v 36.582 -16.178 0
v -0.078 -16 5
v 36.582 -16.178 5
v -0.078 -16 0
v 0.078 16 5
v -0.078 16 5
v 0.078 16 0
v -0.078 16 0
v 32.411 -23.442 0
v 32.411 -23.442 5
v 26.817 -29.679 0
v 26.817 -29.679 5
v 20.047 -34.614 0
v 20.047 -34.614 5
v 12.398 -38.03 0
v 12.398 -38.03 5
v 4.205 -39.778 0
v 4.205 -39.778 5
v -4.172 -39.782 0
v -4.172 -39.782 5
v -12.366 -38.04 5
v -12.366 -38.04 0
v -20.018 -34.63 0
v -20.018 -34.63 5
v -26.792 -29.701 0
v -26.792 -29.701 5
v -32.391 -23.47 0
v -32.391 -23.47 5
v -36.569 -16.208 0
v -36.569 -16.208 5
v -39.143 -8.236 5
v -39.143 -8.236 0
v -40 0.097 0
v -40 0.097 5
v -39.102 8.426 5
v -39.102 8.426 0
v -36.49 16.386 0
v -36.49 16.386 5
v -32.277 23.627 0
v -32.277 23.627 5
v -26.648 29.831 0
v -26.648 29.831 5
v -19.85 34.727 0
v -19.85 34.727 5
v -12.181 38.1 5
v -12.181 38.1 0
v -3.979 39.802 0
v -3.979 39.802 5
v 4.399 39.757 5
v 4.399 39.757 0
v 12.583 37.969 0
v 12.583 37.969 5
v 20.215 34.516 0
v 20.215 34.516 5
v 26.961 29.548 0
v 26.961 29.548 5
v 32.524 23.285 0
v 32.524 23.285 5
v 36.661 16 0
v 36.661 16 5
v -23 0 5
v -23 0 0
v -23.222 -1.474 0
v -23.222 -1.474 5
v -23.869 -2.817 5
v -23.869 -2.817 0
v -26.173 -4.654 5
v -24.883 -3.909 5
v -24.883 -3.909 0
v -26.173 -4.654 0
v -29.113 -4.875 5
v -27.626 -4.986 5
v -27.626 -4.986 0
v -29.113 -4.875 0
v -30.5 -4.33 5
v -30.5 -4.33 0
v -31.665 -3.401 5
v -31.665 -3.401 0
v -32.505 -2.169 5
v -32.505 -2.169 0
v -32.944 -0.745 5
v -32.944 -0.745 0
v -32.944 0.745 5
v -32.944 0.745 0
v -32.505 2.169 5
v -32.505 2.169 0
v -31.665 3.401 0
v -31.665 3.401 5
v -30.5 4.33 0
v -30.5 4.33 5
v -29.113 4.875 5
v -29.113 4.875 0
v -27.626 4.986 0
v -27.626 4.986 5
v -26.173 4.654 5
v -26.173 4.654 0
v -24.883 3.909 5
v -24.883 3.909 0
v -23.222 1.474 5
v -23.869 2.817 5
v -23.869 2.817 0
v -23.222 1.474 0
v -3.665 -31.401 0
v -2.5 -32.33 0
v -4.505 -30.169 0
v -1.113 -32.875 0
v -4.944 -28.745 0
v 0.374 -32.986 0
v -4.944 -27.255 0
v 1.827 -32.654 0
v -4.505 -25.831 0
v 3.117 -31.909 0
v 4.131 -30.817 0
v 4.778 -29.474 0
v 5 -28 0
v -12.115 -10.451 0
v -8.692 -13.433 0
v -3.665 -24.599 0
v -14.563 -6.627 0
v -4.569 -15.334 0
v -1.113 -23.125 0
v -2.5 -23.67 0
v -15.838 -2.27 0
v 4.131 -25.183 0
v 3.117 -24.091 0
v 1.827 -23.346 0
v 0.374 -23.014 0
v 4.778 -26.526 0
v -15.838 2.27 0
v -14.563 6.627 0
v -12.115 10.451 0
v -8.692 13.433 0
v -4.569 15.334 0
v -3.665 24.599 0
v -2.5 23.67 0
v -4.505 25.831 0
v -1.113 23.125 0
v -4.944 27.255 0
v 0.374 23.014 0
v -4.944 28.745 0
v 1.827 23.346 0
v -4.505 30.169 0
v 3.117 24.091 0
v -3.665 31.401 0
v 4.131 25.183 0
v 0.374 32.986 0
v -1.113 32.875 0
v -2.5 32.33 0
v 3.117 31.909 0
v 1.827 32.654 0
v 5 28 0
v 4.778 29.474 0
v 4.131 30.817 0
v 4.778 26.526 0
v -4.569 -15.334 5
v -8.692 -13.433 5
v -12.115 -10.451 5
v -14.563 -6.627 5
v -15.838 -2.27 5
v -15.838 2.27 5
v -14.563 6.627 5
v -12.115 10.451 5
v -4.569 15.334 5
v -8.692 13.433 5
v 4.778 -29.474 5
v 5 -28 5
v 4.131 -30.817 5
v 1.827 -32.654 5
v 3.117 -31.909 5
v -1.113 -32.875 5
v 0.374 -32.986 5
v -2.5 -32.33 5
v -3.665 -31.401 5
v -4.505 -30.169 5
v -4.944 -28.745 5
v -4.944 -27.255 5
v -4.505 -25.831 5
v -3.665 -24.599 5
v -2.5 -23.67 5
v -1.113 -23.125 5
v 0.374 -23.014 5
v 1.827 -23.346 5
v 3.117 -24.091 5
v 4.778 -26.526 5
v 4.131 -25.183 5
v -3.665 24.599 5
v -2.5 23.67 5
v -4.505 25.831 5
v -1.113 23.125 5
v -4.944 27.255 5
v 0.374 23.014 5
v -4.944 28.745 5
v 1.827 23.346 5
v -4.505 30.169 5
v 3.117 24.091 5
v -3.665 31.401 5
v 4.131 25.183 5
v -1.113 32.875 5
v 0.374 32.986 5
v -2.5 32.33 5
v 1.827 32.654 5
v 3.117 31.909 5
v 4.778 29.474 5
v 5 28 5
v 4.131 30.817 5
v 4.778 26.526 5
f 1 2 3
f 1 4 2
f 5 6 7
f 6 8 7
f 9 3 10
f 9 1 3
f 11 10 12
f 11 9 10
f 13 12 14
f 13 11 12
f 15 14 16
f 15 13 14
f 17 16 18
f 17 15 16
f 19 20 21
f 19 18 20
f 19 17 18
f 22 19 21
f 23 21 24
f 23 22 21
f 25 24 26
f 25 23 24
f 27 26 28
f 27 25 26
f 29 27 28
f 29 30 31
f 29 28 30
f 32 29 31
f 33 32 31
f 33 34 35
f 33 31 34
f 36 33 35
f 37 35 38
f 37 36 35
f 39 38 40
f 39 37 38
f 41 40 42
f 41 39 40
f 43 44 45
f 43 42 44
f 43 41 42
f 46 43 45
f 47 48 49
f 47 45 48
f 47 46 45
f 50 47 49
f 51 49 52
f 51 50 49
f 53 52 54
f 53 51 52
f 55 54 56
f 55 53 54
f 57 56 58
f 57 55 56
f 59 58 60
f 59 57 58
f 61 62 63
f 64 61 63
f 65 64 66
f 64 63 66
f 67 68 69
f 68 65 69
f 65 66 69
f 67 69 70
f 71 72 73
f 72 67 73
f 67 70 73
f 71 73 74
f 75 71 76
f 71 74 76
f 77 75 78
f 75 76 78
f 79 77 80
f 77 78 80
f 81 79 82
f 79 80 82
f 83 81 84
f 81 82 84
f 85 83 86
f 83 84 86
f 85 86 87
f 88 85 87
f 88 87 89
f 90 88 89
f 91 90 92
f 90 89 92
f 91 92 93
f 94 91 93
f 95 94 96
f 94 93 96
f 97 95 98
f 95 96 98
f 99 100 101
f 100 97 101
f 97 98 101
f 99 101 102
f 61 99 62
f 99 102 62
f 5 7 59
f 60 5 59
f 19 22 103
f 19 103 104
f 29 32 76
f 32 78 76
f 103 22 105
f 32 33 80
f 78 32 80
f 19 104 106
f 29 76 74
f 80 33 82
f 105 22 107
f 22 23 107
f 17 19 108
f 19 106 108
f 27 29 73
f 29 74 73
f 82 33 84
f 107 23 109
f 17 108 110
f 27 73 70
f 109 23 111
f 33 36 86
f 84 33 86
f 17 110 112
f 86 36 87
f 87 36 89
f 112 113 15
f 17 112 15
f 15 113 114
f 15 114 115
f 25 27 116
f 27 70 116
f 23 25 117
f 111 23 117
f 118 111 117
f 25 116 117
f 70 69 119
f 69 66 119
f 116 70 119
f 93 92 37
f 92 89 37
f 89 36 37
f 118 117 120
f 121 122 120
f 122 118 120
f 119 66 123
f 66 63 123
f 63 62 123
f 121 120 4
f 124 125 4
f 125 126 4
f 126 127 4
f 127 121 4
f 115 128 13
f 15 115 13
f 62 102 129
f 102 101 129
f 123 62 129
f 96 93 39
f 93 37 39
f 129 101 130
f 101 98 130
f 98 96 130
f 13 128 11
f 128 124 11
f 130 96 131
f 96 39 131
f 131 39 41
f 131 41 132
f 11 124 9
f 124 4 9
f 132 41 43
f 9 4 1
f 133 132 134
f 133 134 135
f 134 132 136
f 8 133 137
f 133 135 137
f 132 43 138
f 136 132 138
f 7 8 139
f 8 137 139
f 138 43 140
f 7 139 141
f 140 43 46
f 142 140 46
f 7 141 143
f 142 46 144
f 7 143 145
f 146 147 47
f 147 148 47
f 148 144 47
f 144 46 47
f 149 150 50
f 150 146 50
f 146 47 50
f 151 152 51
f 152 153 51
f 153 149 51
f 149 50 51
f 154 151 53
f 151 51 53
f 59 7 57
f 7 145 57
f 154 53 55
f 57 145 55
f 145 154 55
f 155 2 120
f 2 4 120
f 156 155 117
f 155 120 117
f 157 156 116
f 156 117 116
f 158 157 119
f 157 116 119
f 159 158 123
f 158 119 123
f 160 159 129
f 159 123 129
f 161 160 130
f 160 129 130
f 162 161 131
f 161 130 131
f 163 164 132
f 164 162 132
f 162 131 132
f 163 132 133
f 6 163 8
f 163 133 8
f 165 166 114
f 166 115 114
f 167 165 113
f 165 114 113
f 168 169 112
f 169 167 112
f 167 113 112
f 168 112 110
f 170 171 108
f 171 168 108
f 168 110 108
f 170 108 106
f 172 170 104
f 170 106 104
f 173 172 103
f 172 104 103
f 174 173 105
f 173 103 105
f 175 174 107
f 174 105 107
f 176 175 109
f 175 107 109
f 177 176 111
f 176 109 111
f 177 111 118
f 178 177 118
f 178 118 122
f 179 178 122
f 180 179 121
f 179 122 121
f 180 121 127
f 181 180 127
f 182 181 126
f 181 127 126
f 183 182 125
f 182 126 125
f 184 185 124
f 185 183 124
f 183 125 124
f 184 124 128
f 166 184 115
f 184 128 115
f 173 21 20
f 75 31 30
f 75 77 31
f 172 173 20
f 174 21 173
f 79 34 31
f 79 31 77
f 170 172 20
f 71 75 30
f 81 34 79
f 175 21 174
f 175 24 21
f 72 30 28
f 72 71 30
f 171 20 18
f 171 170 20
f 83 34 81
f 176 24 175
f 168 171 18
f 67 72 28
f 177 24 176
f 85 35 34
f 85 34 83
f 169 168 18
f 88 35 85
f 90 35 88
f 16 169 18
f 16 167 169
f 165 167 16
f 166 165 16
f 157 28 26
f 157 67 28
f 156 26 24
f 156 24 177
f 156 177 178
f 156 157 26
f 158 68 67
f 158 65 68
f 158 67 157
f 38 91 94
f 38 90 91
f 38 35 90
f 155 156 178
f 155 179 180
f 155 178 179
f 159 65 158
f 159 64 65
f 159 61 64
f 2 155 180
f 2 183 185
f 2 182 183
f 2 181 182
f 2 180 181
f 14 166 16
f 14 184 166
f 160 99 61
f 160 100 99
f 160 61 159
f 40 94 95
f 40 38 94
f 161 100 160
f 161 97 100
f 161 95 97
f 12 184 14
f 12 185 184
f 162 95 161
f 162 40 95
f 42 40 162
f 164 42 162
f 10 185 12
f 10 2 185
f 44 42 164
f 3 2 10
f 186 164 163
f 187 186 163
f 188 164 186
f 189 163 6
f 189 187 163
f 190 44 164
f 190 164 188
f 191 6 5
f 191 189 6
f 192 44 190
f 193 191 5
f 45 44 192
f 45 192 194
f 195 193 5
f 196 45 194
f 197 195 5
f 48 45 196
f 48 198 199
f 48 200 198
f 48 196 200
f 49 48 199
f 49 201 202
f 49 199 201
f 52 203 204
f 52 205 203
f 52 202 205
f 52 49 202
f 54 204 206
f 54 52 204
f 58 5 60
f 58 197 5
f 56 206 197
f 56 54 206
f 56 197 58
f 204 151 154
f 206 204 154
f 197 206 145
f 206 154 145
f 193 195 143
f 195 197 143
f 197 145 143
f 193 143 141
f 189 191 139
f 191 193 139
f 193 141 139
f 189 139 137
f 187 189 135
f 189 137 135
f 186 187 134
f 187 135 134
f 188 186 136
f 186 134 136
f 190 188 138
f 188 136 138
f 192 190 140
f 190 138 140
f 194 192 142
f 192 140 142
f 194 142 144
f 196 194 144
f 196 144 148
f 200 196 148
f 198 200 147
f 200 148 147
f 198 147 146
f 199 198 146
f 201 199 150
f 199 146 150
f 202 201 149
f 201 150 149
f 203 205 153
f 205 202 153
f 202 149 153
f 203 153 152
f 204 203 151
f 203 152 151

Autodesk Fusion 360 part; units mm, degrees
sketch "Sketch1" plane through (0, 0, 0) normal (0, 0, 1) x (1, 0, 0)
  circle A0 centre (-28, 0) radius 5
  circle A1 centre (0, 28) radius 5
  circle A2 centre (0, -28) radius 5
  line L0 (-0.0776, 15.9998) -> (36.6607, 15.9998)
  line L1 (-0.0776, -15.9998) -> (36.5825, -16.1777)
  arc A3 (36.6607, 15.9998) -> (36.5825, -16.1777) centre (0, 0) ccw
  arc A4 (0.0776, 15.9998) -> (-0.0776, -15.9998) centre (0, 0) ccw
  dimension "d1" = 80
  dimension "d3" = 28
  dimension "d4" = 10
  dimension "d5" = 28
  dimension "d6" = 28
  dimension "d7" = 10
  dimension "d8" = 10
extrude "Extrude1" add sketch "Sketch1" along normal blind 5
